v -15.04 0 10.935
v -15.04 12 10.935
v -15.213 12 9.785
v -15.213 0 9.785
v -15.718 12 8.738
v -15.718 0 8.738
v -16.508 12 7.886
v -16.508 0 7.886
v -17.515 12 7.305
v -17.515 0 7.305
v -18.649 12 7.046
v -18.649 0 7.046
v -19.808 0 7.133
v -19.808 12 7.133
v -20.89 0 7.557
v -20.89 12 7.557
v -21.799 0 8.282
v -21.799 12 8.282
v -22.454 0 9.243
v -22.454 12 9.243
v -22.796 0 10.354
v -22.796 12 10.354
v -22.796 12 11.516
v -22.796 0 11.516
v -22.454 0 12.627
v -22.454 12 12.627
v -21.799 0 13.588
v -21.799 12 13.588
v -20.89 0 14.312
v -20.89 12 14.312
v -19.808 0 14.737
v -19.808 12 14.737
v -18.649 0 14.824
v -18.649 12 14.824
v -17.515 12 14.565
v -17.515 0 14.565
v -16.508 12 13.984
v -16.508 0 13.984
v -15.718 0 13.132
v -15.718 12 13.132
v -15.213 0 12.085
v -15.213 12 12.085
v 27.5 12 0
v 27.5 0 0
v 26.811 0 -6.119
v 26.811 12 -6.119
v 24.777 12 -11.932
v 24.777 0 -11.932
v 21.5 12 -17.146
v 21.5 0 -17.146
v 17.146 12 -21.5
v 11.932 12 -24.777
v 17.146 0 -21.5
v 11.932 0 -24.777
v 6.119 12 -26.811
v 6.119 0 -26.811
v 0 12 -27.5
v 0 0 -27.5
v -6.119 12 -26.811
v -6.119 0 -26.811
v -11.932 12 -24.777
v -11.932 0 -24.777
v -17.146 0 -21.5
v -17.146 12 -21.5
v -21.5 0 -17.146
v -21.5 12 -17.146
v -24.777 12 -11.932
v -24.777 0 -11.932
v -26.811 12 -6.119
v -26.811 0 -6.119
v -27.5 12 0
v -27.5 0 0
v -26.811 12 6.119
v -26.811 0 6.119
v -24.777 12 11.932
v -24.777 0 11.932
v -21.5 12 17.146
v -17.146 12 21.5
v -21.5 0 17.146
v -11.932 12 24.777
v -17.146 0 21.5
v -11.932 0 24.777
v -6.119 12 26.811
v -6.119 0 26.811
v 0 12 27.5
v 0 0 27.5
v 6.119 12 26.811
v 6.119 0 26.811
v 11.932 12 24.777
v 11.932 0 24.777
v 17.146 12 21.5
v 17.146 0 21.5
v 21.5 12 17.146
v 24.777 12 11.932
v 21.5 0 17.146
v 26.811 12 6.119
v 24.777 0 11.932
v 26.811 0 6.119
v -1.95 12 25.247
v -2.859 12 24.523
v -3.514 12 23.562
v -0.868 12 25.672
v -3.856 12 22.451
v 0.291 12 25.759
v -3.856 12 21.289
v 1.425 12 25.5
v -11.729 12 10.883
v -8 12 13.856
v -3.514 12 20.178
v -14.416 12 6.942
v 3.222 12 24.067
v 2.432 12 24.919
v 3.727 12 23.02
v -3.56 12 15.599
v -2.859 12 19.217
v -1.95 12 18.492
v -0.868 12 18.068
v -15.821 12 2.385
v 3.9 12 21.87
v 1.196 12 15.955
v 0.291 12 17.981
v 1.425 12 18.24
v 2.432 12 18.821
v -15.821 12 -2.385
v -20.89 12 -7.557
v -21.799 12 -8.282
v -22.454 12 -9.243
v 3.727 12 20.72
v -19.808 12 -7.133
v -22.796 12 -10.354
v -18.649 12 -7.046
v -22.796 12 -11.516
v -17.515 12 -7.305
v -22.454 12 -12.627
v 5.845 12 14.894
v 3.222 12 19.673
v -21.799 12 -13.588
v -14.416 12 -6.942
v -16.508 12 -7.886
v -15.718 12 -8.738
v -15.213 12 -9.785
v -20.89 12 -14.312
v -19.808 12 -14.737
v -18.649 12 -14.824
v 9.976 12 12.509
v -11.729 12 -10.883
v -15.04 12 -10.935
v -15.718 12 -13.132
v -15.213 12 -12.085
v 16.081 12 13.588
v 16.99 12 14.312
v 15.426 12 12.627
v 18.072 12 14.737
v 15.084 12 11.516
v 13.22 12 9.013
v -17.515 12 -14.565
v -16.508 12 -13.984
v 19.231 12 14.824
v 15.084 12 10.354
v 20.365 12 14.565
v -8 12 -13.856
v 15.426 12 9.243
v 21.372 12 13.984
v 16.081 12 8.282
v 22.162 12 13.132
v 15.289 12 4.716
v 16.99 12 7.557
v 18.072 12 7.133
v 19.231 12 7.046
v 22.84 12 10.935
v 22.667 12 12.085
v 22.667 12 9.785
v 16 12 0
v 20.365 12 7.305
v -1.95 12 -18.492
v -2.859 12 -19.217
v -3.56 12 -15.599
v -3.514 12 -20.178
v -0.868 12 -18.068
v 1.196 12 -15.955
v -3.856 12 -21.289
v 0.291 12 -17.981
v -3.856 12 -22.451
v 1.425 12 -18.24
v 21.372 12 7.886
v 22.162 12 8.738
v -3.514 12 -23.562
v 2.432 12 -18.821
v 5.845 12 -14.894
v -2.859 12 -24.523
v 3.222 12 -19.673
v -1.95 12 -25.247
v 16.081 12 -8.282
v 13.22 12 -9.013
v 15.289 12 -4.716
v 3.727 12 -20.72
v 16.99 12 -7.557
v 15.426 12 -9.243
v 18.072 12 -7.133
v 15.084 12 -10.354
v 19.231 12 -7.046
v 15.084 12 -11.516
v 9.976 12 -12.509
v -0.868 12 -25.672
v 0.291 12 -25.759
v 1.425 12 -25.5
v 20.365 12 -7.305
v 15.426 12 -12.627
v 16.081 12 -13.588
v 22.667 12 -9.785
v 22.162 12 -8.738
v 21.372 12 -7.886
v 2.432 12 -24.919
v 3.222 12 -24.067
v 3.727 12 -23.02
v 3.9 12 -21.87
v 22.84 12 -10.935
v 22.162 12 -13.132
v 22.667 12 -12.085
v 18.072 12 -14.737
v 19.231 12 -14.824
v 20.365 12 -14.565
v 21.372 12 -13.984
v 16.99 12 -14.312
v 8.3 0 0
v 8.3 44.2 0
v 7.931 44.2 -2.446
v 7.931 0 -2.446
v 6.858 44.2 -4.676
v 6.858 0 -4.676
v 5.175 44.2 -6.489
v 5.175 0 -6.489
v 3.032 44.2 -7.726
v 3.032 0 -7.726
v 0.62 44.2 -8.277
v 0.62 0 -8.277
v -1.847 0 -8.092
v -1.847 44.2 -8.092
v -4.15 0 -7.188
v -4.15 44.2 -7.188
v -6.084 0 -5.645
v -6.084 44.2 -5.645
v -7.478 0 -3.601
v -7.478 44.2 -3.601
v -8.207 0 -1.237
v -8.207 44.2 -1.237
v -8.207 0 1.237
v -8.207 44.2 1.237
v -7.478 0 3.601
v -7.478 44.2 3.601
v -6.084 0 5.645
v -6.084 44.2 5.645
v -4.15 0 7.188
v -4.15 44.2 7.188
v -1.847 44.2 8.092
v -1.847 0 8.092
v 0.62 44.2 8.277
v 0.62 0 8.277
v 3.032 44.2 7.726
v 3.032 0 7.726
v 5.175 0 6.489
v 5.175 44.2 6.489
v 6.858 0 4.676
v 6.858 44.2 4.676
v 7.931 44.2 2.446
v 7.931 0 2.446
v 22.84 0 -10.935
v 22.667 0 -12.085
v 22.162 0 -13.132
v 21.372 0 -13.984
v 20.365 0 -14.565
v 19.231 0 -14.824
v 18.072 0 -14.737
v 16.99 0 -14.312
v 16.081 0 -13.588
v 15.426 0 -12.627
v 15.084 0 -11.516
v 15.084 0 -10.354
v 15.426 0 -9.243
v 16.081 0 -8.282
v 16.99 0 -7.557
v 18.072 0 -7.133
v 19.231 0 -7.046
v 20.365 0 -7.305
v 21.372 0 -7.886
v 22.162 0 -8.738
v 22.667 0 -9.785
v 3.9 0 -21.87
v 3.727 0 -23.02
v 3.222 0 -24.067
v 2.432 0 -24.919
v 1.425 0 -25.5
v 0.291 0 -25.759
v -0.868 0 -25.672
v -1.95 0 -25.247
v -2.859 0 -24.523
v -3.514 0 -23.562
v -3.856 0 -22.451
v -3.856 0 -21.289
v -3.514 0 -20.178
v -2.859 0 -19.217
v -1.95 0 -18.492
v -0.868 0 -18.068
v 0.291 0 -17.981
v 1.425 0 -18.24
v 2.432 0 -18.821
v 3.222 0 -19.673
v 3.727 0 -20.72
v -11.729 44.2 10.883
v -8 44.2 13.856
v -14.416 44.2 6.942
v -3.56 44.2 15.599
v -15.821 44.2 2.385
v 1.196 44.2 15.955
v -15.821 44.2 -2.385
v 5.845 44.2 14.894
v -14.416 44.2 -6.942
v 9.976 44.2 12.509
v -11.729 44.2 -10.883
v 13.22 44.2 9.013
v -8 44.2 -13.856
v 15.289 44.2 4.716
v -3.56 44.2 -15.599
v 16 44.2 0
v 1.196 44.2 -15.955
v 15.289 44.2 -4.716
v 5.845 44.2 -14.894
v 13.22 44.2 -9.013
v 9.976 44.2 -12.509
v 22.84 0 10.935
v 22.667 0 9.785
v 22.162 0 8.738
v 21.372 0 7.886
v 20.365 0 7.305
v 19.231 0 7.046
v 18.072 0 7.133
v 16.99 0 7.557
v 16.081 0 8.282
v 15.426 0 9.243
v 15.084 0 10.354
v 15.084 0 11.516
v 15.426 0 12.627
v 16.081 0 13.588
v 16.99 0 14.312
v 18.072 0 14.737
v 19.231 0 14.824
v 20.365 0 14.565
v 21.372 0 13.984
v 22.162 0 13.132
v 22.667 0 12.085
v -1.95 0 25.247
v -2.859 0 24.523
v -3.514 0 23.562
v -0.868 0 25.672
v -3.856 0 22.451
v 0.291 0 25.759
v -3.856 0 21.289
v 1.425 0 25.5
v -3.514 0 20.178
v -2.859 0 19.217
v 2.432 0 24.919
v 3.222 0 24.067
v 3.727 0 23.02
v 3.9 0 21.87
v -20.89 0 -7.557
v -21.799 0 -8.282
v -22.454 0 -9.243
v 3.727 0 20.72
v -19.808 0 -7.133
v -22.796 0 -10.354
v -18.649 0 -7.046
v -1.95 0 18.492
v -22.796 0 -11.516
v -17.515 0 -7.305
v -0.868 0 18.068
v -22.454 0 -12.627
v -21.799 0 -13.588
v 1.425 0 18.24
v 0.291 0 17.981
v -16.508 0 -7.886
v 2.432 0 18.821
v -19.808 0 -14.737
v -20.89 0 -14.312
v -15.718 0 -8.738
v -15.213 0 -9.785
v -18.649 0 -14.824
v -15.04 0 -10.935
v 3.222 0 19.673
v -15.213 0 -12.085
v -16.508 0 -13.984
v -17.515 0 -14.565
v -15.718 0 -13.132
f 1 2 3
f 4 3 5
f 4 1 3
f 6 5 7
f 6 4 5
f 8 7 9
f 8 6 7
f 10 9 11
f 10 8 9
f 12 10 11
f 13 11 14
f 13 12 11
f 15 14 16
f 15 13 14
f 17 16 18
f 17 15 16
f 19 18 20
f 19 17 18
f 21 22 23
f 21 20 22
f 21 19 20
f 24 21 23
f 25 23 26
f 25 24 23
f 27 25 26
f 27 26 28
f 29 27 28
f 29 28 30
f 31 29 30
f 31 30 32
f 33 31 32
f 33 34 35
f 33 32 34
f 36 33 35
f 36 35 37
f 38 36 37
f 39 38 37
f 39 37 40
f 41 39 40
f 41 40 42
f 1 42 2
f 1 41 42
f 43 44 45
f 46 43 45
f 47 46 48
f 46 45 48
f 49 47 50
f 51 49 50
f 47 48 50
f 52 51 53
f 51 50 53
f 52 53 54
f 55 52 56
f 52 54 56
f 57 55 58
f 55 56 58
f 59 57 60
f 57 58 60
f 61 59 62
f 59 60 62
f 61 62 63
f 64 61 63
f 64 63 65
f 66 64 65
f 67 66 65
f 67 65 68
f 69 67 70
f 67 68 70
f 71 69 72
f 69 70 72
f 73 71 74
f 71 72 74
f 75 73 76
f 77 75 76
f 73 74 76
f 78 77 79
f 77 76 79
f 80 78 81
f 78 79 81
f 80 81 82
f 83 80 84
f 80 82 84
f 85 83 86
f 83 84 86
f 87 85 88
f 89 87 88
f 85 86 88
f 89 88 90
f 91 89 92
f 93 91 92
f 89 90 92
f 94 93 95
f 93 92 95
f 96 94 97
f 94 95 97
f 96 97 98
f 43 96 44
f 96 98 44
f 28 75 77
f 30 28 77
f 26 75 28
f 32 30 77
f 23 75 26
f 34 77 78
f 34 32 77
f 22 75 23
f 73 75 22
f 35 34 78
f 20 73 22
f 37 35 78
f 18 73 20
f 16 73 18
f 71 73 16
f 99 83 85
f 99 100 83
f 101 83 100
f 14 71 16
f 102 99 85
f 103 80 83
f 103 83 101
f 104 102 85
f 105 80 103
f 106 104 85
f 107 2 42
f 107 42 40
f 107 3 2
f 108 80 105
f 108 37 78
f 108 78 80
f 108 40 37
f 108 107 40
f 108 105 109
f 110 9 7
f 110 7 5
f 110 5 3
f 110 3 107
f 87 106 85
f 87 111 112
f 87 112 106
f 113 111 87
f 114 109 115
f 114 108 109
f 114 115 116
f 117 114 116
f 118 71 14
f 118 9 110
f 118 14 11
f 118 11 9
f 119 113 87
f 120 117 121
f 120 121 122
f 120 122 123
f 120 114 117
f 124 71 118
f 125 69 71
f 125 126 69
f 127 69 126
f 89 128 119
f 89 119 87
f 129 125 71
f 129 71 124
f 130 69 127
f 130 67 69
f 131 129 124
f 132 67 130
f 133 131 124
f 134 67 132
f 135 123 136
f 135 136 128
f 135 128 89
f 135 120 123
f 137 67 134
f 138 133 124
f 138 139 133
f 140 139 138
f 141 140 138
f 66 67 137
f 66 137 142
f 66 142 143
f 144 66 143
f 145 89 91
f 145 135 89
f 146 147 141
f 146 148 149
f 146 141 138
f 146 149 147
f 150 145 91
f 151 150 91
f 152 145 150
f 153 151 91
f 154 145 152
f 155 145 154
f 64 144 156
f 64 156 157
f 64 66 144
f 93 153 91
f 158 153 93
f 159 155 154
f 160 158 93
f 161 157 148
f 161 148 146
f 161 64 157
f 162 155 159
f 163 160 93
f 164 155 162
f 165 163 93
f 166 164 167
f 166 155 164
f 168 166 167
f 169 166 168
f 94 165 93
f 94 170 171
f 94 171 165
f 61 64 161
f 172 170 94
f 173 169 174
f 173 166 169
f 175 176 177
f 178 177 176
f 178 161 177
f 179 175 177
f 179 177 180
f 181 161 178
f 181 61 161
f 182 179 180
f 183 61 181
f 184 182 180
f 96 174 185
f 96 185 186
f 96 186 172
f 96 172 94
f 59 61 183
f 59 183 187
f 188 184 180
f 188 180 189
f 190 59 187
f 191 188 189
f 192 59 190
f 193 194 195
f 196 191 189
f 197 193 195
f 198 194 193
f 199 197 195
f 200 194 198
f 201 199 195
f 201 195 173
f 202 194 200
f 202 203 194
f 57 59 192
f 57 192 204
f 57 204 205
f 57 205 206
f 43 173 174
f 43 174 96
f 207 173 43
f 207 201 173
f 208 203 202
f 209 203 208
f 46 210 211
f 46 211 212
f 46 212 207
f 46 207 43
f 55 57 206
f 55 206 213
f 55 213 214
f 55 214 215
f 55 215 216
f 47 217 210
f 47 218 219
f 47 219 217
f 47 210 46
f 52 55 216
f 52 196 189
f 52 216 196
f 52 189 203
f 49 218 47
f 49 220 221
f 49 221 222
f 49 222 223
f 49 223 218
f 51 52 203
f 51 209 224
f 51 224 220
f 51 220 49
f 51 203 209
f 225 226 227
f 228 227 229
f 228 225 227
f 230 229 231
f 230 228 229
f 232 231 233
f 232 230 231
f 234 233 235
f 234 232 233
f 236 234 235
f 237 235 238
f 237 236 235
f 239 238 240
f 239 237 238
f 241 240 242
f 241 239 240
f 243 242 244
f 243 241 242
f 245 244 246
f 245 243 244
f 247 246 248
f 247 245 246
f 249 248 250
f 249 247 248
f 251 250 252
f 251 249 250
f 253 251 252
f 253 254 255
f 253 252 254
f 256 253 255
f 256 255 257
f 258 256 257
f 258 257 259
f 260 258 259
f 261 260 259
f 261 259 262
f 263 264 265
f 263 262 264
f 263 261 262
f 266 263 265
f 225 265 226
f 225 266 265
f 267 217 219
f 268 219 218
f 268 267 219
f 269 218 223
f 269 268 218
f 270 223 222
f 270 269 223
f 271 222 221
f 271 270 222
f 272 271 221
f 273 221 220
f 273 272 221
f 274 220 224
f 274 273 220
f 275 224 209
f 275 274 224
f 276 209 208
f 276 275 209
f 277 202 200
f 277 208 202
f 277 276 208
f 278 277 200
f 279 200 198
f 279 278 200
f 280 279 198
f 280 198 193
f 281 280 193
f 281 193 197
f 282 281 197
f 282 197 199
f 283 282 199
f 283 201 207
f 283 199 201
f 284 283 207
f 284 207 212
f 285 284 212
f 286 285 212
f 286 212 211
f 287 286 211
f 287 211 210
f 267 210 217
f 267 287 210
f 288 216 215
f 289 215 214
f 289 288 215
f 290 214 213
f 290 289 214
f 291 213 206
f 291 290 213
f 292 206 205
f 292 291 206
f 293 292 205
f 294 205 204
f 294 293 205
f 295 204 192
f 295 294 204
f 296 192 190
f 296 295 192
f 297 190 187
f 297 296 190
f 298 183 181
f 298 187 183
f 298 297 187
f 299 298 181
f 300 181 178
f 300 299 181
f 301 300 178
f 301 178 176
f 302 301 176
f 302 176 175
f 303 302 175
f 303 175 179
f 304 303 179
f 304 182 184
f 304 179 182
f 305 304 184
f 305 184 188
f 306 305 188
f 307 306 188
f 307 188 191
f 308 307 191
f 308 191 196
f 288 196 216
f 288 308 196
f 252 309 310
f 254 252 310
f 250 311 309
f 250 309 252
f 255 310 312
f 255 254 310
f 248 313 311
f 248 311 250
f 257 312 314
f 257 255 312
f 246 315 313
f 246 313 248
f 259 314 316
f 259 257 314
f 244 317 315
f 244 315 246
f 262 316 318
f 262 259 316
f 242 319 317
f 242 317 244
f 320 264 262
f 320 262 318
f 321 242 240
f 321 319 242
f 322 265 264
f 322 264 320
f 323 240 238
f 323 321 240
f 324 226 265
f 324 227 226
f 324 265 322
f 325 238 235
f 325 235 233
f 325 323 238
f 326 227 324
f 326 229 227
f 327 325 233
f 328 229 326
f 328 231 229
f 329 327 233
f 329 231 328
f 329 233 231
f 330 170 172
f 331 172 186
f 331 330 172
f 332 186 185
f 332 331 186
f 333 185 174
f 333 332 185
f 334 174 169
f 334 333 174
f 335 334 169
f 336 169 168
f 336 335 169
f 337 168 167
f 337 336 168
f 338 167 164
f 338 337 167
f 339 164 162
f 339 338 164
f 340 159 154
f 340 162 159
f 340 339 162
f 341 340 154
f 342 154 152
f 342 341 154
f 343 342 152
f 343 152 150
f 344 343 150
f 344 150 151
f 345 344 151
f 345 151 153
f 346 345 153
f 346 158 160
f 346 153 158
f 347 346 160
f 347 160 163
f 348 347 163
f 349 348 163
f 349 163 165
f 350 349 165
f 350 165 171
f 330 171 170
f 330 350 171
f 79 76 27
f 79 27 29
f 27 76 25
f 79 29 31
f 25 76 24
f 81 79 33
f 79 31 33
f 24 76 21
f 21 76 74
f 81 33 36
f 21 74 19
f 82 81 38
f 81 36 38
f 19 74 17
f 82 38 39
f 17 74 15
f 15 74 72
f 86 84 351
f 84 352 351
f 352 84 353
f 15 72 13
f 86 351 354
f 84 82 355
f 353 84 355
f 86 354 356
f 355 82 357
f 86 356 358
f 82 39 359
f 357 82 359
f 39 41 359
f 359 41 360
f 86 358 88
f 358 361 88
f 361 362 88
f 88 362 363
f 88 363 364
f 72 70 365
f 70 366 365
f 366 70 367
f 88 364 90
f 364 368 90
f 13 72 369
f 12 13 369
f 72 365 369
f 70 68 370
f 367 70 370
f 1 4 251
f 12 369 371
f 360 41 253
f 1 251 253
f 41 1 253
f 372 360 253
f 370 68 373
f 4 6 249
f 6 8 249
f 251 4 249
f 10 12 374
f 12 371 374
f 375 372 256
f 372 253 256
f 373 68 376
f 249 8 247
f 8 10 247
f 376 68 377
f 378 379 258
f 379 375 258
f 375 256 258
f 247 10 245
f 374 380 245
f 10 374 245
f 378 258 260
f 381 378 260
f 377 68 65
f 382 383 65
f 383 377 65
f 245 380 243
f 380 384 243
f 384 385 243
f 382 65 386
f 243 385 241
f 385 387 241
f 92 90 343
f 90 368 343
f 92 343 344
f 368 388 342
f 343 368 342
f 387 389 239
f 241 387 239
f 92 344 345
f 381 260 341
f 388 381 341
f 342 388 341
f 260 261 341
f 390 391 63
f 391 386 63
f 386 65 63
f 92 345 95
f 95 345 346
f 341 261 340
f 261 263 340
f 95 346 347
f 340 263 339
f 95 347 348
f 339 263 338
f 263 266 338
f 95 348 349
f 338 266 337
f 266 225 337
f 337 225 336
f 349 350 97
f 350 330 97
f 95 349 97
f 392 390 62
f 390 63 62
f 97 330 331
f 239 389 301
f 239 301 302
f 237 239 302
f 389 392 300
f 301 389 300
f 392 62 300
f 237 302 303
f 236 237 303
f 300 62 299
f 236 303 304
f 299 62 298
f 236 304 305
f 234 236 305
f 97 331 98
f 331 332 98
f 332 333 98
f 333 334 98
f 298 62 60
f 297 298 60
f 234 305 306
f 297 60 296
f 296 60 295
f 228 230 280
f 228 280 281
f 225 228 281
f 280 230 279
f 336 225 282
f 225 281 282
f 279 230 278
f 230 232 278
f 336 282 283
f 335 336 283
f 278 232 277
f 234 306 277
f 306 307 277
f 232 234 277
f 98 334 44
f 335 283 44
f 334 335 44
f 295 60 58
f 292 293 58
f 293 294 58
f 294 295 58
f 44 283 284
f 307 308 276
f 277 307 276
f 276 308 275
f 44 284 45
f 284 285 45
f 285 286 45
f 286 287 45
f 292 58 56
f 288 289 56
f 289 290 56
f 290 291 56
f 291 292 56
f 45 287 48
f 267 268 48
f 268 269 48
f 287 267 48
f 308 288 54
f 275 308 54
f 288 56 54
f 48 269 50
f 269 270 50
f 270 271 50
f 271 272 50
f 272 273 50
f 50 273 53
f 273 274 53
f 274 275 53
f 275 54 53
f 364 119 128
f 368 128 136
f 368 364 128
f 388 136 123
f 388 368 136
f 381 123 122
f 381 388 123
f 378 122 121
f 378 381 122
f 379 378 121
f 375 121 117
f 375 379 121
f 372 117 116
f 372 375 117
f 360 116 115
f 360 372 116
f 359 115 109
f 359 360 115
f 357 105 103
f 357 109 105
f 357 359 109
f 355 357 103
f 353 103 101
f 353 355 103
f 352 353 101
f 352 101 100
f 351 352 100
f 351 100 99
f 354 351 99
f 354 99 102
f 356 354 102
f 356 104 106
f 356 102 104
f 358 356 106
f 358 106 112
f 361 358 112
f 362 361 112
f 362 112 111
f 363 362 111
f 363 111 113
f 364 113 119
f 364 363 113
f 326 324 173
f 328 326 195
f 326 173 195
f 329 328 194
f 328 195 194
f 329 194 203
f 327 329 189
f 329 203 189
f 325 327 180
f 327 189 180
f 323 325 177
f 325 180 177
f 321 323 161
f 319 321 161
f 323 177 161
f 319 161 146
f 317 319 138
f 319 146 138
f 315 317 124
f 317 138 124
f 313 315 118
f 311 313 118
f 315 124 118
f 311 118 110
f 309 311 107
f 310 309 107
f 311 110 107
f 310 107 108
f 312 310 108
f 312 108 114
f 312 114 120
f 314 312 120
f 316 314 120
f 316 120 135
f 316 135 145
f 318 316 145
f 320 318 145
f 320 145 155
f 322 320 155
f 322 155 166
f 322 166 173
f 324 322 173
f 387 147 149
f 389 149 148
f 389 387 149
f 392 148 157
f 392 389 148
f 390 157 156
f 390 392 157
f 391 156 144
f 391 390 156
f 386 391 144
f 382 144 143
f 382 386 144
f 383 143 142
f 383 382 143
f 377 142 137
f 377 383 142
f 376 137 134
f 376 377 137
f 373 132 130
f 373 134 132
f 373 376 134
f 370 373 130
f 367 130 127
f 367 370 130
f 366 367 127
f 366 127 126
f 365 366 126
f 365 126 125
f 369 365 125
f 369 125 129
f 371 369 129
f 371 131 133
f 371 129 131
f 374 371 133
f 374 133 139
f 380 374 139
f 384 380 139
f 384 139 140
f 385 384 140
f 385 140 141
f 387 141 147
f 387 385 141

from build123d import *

# Parameters (mm, degrees)
SKETCH1_R           = 27.5
SKETCH1_R_2         = 16
BOSS_EXTRUDE1_DEPTH = 12
SKETCH1_2_R         = 16
BOSS_EXTRUDE2_DEPTH = 44.2
SKETCH3_R           = 8.3
SKETCH3_R_2         = 3.9
CUT_EXTRUDE1_DEPTH  = 45.2


with BuildPart() as part:
    # Sketch1 → Boss-Extrude1 (new body)
    with BuildSketch(Plane(origin=(0, 0, 0), x_dir=(1, 0, 0), z_dir=(0, 1, 0))):
        Circle(SKETCH1_R)
        Circle(SKETCH1_R_2, mode=Mode.SUBTRACT)
    extrude(amount=BOSS_EXTRUDE1_DEPTH)

    # Sketch1<2> → Boss-Extrude2 (add)
    with BuildSketch(Plane(origin=(0, 0, 0), x_dir=(1, 0, 0), z_dir=(0, 1, 0))):
        Circle(SKETCH1_2_R)
    extrude(amount=BOSS_EXTRUDE2_DEPTH)

    # Sketch3 → Cut-Extrude1 (cut, through all)
    with BuildSketch(Plane(origin=(0, 0, 0), x_dir=(1, 0, 0), z_dir=(0, 1, 0))):
        Circle(SKETCH3_R)
        with Locations((0, -21.869969165)):
            Circle(SKETCH3_R_2)
        with Locations((-18.939948877, -10.934984583)):
            Circle(SKETCH3_R_2)
        with Locations((-18.939948877, 10.934984583)):
            Circle(SKETCH3_R_2)
        with Locations((0, 21.869969165)):
            Circle(SKETCH3_R_2)
        with Locations((18.939948877, 10.934984583)):
            Circle(SKETCH3_R_2)
        with Locations((18.939948877, -10.934984583)):
            Circle(SKETCH3_R_2)
    extrude(amount=CUT_EXTRUDE1_DEPTH, mode=Mode.SUBTRACT)


solid = part.part
